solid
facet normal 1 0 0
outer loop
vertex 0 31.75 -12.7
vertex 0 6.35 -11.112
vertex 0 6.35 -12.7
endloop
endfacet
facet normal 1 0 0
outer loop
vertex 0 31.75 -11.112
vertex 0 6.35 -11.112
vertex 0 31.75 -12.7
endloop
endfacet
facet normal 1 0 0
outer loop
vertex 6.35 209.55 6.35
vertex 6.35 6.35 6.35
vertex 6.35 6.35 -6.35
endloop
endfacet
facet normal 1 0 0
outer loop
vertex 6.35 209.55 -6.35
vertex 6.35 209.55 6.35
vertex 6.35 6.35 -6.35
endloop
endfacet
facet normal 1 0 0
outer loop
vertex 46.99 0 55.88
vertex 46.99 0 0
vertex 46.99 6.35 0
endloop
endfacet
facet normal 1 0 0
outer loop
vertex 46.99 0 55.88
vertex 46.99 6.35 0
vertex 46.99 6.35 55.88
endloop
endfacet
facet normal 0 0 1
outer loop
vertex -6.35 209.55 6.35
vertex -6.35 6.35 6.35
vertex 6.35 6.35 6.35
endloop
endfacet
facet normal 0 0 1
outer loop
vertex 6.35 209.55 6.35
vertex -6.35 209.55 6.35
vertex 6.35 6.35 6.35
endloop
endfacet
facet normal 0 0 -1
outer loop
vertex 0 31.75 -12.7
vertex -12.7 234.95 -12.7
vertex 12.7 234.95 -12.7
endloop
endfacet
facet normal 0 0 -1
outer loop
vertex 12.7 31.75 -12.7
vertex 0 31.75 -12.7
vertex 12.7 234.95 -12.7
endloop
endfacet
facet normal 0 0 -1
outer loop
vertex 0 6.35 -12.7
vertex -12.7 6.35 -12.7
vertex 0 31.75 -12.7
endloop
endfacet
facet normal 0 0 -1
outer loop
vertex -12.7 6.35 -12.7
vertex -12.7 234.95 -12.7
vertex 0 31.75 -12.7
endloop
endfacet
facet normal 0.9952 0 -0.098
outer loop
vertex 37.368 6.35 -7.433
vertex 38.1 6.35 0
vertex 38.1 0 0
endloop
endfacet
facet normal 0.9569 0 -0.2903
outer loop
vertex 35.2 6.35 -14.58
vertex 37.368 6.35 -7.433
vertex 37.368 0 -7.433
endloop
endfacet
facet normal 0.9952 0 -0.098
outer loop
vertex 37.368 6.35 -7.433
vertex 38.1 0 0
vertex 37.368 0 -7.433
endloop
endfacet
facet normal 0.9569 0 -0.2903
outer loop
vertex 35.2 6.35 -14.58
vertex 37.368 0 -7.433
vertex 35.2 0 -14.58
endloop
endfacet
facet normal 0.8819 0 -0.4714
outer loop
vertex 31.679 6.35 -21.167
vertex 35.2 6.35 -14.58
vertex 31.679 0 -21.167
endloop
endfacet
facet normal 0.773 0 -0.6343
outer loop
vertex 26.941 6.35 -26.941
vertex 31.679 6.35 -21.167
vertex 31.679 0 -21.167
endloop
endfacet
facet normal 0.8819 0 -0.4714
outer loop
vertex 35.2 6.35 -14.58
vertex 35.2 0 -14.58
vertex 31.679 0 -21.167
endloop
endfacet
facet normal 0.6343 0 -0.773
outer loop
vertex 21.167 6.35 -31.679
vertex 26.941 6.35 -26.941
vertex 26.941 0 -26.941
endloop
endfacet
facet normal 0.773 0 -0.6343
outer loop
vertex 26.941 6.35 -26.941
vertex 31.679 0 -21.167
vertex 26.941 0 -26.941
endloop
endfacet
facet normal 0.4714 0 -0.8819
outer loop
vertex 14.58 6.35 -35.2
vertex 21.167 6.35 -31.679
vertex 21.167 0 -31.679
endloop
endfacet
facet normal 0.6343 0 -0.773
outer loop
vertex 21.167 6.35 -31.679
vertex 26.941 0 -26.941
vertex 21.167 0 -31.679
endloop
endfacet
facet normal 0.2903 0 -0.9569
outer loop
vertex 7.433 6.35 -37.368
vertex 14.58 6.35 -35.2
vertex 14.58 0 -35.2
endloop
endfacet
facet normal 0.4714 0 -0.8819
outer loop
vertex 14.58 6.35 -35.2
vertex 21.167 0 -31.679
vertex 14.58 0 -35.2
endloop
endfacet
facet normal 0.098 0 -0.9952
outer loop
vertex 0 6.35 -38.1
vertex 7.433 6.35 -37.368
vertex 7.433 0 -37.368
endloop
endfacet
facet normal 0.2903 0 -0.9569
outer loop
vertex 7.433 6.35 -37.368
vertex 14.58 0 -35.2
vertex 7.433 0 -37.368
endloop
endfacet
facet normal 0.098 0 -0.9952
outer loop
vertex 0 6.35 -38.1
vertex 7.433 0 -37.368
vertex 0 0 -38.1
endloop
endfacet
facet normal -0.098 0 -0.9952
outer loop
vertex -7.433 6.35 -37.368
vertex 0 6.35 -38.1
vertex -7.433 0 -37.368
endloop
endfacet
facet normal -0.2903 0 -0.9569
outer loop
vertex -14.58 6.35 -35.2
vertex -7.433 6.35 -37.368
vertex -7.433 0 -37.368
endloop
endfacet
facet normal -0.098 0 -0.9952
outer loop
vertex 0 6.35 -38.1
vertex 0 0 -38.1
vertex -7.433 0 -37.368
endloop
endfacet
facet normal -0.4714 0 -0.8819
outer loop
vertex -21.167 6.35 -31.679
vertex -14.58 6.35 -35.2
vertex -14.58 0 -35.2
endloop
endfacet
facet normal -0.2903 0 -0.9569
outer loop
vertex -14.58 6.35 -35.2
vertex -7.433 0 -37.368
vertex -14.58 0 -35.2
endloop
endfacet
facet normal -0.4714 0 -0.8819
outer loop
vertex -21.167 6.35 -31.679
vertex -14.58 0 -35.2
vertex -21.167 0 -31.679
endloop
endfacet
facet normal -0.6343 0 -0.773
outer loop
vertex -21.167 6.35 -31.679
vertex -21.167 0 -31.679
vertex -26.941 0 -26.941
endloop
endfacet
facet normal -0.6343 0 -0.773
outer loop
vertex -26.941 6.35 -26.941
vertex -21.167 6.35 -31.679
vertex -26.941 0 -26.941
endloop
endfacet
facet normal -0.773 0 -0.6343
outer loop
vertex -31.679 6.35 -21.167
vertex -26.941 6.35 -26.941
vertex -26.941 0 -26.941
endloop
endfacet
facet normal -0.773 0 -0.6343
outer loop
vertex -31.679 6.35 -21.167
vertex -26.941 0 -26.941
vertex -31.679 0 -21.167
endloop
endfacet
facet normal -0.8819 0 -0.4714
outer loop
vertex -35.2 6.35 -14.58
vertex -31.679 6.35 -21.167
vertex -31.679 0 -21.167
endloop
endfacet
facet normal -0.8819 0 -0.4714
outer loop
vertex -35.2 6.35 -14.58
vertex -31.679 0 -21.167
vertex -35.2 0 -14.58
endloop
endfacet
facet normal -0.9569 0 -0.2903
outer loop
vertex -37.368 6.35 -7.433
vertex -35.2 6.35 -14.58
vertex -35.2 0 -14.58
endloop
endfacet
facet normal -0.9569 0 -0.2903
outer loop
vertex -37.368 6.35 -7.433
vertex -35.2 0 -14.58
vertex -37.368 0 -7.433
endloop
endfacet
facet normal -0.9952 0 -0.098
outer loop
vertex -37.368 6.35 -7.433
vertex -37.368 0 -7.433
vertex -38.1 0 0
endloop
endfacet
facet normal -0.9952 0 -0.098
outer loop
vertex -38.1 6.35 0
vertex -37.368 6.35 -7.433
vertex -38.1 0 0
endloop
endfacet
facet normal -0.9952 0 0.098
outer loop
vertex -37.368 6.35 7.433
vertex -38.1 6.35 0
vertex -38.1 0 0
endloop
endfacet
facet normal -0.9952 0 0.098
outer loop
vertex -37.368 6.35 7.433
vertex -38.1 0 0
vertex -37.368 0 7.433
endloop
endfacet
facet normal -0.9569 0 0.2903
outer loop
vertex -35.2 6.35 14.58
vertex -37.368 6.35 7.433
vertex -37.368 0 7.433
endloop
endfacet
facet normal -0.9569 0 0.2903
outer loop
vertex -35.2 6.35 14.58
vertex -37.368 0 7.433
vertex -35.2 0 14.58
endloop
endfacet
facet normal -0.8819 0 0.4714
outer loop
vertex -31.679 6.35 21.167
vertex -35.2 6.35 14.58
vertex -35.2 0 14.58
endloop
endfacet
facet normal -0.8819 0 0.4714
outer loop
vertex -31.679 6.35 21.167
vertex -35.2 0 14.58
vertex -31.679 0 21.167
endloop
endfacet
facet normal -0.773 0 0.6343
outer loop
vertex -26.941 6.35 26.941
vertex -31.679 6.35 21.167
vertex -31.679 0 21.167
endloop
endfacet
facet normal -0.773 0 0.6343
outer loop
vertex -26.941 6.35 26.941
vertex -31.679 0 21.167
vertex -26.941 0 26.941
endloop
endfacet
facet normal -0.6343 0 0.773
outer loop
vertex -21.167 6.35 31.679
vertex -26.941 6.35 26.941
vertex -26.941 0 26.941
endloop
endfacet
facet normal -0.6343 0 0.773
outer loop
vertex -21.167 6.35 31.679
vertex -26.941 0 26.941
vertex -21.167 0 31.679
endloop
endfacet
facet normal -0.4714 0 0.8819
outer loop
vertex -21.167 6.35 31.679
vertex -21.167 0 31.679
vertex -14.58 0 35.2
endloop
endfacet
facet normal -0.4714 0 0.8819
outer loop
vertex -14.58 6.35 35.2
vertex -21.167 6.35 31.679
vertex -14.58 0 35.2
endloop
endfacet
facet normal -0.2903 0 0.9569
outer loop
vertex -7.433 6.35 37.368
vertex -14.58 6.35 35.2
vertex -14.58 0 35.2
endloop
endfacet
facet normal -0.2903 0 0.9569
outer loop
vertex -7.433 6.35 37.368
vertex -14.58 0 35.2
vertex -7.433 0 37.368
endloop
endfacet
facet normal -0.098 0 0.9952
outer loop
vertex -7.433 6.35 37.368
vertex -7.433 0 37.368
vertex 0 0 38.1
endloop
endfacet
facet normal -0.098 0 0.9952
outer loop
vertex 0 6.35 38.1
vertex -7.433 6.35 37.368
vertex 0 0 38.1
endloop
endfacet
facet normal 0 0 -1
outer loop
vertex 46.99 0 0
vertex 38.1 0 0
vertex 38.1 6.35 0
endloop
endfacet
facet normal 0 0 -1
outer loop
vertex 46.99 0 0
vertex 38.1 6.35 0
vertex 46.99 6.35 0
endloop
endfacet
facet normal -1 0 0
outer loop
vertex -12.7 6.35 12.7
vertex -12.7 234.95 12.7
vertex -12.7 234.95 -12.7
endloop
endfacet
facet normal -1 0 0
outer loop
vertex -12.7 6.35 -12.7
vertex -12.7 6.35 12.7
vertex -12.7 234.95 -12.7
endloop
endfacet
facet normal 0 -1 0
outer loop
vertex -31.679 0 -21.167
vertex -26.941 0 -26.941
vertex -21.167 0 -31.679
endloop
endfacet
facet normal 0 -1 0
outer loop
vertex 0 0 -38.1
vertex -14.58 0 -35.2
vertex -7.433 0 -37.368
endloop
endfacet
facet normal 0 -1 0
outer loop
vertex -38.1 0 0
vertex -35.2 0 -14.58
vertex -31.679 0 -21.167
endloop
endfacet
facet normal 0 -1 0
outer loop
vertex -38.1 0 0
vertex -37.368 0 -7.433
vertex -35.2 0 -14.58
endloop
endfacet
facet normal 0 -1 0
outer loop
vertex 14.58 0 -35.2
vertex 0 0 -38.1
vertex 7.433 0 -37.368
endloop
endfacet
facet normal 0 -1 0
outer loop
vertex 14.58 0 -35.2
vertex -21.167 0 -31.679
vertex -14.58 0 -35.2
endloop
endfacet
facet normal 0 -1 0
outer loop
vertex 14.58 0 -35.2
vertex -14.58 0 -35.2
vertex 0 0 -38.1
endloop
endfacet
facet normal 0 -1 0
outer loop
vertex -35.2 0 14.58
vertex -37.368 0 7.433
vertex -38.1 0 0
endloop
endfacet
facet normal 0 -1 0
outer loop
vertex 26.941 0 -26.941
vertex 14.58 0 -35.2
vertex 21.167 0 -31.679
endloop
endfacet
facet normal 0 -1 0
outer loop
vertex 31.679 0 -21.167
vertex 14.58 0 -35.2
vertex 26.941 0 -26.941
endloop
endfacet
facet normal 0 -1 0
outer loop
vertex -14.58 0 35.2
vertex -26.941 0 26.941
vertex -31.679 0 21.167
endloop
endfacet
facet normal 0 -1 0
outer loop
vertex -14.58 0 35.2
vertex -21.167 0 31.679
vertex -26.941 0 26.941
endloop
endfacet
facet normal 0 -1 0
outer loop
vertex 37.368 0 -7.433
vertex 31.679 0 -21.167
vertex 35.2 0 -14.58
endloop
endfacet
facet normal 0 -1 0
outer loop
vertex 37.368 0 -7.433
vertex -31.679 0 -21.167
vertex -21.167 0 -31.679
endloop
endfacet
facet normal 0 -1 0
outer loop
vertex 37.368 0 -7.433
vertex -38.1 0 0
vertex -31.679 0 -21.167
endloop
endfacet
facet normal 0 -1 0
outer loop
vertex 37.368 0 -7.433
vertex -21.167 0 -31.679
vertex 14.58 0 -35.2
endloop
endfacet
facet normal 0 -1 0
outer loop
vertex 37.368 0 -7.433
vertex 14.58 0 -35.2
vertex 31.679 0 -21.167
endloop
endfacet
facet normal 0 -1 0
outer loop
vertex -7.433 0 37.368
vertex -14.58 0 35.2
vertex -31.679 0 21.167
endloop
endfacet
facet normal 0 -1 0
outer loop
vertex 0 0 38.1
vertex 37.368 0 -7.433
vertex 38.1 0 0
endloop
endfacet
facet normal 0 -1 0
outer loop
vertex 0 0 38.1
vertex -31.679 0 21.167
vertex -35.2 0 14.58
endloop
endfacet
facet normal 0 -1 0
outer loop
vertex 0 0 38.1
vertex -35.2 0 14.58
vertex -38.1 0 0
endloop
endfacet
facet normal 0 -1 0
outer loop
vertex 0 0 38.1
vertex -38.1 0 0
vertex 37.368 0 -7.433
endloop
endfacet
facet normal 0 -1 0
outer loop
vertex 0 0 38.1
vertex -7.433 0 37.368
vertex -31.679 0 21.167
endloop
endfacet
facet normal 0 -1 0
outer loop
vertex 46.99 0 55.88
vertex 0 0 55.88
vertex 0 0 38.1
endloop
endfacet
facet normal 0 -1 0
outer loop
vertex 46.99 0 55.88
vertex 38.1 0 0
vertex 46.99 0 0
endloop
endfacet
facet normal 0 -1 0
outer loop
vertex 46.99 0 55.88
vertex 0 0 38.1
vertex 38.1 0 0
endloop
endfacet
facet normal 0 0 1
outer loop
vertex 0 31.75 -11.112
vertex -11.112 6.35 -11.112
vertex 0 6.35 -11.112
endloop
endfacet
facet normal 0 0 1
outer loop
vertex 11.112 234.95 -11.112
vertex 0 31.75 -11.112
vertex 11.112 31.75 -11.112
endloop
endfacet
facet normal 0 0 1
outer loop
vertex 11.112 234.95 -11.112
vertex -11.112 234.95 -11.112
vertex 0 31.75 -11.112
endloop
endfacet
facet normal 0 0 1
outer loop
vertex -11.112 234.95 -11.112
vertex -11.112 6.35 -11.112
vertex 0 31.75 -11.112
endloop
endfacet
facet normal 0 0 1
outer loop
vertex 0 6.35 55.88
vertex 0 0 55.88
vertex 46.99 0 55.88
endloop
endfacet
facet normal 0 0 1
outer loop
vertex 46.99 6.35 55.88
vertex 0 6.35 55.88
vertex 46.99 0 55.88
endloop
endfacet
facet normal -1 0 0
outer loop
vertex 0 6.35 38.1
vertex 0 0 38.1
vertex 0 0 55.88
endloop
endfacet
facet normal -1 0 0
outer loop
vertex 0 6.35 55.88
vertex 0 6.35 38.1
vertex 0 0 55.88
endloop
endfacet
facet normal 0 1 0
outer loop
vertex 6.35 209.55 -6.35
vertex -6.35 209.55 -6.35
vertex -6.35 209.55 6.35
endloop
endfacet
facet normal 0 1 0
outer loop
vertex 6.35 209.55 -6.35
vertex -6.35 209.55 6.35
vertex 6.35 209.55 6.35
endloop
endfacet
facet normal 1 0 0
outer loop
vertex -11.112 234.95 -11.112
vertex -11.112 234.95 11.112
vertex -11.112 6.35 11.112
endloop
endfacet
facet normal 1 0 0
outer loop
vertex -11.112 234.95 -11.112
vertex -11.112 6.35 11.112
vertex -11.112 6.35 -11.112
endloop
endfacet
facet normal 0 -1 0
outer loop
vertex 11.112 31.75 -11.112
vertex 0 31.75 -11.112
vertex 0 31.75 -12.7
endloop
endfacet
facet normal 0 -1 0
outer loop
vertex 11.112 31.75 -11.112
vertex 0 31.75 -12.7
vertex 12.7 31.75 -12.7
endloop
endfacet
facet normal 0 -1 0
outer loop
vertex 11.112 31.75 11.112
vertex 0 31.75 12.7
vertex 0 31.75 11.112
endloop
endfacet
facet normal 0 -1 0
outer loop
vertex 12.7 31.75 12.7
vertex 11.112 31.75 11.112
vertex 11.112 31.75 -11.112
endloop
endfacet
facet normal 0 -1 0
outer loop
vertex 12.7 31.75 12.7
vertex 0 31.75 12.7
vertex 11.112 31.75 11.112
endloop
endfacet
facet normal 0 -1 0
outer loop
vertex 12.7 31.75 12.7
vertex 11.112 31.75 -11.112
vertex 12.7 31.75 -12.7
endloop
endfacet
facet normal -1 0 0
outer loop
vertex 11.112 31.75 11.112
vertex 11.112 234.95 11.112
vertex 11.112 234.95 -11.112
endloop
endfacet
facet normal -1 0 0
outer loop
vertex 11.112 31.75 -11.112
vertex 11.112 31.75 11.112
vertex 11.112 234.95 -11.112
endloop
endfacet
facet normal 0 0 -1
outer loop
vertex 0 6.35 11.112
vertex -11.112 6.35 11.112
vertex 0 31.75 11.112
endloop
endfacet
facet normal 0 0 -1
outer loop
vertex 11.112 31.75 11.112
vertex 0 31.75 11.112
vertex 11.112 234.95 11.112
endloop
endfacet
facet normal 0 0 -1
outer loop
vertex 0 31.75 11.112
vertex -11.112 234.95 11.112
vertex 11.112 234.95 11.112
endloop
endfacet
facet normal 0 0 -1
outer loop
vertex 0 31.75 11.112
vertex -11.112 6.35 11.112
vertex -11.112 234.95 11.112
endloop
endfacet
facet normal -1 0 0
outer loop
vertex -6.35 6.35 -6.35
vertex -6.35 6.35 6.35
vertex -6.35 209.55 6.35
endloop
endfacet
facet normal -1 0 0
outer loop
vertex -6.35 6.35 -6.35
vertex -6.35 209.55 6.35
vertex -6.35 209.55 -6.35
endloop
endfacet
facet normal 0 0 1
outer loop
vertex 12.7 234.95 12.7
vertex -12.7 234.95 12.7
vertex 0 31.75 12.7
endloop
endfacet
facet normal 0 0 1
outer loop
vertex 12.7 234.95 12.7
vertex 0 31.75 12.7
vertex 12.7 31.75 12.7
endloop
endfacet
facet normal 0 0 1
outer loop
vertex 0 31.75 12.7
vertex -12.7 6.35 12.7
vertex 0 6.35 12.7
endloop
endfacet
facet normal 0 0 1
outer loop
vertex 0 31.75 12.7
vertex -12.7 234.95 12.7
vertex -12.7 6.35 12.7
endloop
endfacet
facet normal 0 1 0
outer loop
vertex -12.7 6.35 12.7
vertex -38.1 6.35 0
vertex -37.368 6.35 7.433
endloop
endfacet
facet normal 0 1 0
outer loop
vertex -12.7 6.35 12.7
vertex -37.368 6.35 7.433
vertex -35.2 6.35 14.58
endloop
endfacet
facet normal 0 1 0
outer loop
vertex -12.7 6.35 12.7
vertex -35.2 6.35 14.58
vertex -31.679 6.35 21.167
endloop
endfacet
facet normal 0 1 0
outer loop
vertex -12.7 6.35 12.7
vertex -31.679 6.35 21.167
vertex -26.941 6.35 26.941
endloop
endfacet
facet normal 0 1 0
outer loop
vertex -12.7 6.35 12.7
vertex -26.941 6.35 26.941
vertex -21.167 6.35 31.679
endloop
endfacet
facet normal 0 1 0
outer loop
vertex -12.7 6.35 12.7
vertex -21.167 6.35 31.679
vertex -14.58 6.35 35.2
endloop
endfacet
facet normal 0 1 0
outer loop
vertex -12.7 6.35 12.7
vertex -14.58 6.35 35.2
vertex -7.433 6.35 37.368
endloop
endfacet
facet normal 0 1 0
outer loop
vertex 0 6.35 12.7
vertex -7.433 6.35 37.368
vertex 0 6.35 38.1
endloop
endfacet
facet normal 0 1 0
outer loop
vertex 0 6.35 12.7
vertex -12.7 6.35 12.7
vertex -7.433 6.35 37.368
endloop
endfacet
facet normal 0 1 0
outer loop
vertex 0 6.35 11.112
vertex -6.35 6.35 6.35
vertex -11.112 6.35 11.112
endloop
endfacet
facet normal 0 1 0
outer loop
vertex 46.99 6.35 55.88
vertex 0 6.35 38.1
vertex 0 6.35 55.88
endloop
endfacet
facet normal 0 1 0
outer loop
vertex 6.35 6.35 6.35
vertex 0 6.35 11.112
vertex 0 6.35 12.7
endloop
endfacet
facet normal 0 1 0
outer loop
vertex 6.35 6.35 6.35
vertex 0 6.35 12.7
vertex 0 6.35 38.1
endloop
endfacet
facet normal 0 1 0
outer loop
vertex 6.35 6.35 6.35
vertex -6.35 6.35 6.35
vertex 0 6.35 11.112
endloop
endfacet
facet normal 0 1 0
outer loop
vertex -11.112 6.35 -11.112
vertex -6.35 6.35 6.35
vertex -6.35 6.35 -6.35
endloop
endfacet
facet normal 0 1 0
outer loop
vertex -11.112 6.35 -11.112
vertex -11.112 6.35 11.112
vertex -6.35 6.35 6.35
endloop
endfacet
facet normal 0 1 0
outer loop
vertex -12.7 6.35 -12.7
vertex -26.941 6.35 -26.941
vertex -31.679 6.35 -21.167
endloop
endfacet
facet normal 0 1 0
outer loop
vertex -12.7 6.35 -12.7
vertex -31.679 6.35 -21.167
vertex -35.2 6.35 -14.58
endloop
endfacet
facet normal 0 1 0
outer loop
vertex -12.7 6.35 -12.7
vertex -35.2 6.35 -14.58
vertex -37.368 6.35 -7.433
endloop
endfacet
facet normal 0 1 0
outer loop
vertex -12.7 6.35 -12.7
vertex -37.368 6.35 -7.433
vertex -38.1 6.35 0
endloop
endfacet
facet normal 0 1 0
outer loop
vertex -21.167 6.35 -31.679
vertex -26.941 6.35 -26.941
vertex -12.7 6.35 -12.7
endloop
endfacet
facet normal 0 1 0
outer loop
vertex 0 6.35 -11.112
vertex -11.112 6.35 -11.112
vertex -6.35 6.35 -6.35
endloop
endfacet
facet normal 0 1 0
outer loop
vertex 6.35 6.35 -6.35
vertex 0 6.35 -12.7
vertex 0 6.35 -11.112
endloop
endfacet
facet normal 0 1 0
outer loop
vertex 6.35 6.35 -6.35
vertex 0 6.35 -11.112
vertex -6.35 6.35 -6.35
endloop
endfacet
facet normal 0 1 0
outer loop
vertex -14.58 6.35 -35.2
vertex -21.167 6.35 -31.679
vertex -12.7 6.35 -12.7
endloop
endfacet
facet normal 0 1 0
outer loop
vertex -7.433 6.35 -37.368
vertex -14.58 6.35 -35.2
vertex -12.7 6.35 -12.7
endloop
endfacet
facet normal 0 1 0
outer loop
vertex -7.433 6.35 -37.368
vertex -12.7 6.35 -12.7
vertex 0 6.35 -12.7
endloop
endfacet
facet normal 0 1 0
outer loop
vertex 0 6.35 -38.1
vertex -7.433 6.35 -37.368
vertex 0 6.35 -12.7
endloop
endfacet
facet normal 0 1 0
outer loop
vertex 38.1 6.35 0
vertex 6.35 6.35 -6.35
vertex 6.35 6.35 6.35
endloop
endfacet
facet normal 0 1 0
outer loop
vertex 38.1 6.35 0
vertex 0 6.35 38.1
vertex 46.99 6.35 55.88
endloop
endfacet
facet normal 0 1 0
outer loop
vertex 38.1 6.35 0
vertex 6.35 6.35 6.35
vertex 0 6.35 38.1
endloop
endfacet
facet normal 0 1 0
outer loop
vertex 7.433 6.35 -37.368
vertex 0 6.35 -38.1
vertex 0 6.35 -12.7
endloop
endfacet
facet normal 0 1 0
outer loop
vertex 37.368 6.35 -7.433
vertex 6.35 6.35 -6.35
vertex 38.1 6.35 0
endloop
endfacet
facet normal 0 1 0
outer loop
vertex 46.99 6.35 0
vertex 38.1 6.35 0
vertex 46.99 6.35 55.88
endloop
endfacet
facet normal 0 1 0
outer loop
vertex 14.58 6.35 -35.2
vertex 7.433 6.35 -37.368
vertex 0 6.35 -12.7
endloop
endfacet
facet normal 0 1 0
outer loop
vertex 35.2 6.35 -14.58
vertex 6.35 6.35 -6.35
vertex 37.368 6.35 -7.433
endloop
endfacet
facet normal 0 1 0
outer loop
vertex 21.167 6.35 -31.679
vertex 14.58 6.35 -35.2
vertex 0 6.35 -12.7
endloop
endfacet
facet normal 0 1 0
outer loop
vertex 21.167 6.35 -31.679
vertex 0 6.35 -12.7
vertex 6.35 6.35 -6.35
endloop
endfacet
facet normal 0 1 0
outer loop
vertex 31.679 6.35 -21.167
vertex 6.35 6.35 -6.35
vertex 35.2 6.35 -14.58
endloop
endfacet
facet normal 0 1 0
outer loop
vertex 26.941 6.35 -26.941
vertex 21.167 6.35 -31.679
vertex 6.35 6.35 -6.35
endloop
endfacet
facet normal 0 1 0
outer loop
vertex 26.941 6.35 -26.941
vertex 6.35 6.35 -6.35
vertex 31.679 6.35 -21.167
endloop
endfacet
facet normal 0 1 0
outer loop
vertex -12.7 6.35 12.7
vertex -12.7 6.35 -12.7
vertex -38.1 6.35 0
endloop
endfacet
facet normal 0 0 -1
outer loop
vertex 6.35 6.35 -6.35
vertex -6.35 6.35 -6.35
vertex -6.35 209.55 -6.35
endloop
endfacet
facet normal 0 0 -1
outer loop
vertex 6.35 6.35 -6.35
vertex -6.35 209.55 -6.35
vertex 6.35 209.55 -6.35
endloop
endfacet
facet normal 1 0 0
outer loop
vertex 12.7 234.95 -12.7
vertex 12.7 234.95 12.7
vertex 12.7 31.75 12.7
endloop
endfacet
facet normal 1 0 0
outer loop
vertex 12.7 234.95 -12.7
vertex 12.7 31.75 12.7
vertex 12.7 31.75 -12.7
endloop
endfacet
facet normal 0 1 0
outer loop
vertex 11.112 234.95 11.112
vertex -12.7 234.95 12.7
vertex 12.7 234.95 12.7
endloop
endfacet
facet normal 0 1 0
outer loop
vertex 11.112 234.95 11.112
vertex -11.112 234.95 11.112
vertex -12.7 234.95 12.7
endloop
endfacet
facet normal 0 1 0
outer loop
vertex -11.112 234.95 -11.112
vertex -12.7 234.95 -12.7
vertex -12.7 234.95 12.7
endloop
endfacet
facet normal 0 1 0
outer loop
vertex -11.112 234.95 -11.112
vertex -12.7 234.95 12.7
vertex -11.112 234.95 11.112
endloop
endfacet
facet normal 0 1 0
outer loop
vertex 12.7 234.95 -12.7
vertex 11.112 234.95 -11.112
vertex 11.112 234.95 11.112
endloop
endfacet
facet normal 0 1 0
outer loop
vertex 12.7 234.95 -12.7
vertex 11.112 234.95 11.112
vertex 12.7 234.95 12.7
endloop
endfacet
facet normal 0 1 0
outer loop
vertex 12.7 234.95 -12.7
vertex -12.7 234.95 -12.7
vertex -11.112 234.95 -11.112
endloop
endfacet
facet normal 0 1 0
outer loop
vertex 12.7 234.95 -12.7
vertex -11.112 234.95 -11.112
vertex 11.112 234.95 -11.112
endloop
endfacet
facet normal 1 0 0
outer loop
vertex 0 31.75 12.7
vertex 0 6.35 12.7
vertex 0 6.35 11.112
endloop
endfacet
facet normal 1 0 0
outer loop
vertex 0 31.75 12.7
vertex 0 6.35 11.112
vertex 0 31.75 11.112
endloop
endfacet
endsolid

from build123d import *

# Parameters (mm, degrees)
SKETCH1_R           = 38.1
BOSS_EXTRUDE1_DEPTH = 6.35
SKETCH4_W           = 25.4
SKETCH4_H           = 25.4
BOSS_EXTRUDE2_DEPTH = 228.6
SKETCH5_W           = 22.225
SKETCH5_H           = 22.225
CUT_EXTRUDE1_DEPTH  = 228.6
SKETCH8_W           = 12.7
SKETCH8_H           = 25.4
CUT_EXTRUDE2_DEPTH  = 25.4
SKETCH7_W           = 12.7
SKETCH7_H           = 12.7
BOSS_EXTRUDE4_DEPTH = 203.2
SKETCH9_W           = 46.99
SKETCH9_H           = 55.88
BOSS_EXTRUDE5_DEPTH = 6.35


with BuildPart() as part:
    # Sketch1 → Boss-Extrude1 (new body)
    with BuildSketch(Plane(origin=(0, 0, 0), x_dir=(1, 0, 0), z_dir=(0, 1, 0))):
        Circle(SKETCH1_R)
    extrude(amount=BOSS_EXTRUDE1_DEPTH)

    # Sketch4 → Boss-Extrude2 (add)
    with BuildSketch(Plane(origin=(0, 6.35, 0), x_dir=(1, 0, 0), z_dir=(0, 1, 0))):
        Rectangle(SKETCH4_W, SKETCH4_H)
    extrude(amount=BOSS_EXTRUDE2_DEPTH)

    # Sketch5 → Cut-Extrude1 (cut)
    with BuildSketch(Plane(origin=(0, 234.95, 0), x_dir=(1, 0, 0), z_dir=(0, 1, 0))):
        Rectangle(SKETCH5_W, SKETCH5_H)
    extrude(amount=-CUT_EXTRUDE1_DEPTH, mode=Mode.SUBTRACT)

    # Sketch8 → Cut-Extrude2 (cut)
    with BuildSketch(Plane.XY.offset(12.7)):
        with Locations((6.35, 19.05)):
            Rectangle(SKETCH8_W, SKETCH8_H)
    extrude(amount=-CUT_EXTRUDE2_DEPTH, mode=Mode.SUBTRACT)

    # Sketch7 → Boss-Extrude4 (add)
    with BuildSketch(Plane(origin=(0, 6.35, 0), x_dir=(1, 0, 0), z_dir=(0, 1, 0))):
        Rectangle(SKETCH7_W, SKETCH7_H)
    extrude(amount=BOSS_EXTRUDE4_DEPTH)

    # Sketch9 → Boss-Extrude5 (add)
    with BuildSketch(Plane.XZ):
        with Locations((23.495, 27.94)):
            Rectangle(SKETCH9_W, SKETCH9_H)
    extrude(amount=-BOSS_EXTRUDE5_DEPTH)


solid = part.part
